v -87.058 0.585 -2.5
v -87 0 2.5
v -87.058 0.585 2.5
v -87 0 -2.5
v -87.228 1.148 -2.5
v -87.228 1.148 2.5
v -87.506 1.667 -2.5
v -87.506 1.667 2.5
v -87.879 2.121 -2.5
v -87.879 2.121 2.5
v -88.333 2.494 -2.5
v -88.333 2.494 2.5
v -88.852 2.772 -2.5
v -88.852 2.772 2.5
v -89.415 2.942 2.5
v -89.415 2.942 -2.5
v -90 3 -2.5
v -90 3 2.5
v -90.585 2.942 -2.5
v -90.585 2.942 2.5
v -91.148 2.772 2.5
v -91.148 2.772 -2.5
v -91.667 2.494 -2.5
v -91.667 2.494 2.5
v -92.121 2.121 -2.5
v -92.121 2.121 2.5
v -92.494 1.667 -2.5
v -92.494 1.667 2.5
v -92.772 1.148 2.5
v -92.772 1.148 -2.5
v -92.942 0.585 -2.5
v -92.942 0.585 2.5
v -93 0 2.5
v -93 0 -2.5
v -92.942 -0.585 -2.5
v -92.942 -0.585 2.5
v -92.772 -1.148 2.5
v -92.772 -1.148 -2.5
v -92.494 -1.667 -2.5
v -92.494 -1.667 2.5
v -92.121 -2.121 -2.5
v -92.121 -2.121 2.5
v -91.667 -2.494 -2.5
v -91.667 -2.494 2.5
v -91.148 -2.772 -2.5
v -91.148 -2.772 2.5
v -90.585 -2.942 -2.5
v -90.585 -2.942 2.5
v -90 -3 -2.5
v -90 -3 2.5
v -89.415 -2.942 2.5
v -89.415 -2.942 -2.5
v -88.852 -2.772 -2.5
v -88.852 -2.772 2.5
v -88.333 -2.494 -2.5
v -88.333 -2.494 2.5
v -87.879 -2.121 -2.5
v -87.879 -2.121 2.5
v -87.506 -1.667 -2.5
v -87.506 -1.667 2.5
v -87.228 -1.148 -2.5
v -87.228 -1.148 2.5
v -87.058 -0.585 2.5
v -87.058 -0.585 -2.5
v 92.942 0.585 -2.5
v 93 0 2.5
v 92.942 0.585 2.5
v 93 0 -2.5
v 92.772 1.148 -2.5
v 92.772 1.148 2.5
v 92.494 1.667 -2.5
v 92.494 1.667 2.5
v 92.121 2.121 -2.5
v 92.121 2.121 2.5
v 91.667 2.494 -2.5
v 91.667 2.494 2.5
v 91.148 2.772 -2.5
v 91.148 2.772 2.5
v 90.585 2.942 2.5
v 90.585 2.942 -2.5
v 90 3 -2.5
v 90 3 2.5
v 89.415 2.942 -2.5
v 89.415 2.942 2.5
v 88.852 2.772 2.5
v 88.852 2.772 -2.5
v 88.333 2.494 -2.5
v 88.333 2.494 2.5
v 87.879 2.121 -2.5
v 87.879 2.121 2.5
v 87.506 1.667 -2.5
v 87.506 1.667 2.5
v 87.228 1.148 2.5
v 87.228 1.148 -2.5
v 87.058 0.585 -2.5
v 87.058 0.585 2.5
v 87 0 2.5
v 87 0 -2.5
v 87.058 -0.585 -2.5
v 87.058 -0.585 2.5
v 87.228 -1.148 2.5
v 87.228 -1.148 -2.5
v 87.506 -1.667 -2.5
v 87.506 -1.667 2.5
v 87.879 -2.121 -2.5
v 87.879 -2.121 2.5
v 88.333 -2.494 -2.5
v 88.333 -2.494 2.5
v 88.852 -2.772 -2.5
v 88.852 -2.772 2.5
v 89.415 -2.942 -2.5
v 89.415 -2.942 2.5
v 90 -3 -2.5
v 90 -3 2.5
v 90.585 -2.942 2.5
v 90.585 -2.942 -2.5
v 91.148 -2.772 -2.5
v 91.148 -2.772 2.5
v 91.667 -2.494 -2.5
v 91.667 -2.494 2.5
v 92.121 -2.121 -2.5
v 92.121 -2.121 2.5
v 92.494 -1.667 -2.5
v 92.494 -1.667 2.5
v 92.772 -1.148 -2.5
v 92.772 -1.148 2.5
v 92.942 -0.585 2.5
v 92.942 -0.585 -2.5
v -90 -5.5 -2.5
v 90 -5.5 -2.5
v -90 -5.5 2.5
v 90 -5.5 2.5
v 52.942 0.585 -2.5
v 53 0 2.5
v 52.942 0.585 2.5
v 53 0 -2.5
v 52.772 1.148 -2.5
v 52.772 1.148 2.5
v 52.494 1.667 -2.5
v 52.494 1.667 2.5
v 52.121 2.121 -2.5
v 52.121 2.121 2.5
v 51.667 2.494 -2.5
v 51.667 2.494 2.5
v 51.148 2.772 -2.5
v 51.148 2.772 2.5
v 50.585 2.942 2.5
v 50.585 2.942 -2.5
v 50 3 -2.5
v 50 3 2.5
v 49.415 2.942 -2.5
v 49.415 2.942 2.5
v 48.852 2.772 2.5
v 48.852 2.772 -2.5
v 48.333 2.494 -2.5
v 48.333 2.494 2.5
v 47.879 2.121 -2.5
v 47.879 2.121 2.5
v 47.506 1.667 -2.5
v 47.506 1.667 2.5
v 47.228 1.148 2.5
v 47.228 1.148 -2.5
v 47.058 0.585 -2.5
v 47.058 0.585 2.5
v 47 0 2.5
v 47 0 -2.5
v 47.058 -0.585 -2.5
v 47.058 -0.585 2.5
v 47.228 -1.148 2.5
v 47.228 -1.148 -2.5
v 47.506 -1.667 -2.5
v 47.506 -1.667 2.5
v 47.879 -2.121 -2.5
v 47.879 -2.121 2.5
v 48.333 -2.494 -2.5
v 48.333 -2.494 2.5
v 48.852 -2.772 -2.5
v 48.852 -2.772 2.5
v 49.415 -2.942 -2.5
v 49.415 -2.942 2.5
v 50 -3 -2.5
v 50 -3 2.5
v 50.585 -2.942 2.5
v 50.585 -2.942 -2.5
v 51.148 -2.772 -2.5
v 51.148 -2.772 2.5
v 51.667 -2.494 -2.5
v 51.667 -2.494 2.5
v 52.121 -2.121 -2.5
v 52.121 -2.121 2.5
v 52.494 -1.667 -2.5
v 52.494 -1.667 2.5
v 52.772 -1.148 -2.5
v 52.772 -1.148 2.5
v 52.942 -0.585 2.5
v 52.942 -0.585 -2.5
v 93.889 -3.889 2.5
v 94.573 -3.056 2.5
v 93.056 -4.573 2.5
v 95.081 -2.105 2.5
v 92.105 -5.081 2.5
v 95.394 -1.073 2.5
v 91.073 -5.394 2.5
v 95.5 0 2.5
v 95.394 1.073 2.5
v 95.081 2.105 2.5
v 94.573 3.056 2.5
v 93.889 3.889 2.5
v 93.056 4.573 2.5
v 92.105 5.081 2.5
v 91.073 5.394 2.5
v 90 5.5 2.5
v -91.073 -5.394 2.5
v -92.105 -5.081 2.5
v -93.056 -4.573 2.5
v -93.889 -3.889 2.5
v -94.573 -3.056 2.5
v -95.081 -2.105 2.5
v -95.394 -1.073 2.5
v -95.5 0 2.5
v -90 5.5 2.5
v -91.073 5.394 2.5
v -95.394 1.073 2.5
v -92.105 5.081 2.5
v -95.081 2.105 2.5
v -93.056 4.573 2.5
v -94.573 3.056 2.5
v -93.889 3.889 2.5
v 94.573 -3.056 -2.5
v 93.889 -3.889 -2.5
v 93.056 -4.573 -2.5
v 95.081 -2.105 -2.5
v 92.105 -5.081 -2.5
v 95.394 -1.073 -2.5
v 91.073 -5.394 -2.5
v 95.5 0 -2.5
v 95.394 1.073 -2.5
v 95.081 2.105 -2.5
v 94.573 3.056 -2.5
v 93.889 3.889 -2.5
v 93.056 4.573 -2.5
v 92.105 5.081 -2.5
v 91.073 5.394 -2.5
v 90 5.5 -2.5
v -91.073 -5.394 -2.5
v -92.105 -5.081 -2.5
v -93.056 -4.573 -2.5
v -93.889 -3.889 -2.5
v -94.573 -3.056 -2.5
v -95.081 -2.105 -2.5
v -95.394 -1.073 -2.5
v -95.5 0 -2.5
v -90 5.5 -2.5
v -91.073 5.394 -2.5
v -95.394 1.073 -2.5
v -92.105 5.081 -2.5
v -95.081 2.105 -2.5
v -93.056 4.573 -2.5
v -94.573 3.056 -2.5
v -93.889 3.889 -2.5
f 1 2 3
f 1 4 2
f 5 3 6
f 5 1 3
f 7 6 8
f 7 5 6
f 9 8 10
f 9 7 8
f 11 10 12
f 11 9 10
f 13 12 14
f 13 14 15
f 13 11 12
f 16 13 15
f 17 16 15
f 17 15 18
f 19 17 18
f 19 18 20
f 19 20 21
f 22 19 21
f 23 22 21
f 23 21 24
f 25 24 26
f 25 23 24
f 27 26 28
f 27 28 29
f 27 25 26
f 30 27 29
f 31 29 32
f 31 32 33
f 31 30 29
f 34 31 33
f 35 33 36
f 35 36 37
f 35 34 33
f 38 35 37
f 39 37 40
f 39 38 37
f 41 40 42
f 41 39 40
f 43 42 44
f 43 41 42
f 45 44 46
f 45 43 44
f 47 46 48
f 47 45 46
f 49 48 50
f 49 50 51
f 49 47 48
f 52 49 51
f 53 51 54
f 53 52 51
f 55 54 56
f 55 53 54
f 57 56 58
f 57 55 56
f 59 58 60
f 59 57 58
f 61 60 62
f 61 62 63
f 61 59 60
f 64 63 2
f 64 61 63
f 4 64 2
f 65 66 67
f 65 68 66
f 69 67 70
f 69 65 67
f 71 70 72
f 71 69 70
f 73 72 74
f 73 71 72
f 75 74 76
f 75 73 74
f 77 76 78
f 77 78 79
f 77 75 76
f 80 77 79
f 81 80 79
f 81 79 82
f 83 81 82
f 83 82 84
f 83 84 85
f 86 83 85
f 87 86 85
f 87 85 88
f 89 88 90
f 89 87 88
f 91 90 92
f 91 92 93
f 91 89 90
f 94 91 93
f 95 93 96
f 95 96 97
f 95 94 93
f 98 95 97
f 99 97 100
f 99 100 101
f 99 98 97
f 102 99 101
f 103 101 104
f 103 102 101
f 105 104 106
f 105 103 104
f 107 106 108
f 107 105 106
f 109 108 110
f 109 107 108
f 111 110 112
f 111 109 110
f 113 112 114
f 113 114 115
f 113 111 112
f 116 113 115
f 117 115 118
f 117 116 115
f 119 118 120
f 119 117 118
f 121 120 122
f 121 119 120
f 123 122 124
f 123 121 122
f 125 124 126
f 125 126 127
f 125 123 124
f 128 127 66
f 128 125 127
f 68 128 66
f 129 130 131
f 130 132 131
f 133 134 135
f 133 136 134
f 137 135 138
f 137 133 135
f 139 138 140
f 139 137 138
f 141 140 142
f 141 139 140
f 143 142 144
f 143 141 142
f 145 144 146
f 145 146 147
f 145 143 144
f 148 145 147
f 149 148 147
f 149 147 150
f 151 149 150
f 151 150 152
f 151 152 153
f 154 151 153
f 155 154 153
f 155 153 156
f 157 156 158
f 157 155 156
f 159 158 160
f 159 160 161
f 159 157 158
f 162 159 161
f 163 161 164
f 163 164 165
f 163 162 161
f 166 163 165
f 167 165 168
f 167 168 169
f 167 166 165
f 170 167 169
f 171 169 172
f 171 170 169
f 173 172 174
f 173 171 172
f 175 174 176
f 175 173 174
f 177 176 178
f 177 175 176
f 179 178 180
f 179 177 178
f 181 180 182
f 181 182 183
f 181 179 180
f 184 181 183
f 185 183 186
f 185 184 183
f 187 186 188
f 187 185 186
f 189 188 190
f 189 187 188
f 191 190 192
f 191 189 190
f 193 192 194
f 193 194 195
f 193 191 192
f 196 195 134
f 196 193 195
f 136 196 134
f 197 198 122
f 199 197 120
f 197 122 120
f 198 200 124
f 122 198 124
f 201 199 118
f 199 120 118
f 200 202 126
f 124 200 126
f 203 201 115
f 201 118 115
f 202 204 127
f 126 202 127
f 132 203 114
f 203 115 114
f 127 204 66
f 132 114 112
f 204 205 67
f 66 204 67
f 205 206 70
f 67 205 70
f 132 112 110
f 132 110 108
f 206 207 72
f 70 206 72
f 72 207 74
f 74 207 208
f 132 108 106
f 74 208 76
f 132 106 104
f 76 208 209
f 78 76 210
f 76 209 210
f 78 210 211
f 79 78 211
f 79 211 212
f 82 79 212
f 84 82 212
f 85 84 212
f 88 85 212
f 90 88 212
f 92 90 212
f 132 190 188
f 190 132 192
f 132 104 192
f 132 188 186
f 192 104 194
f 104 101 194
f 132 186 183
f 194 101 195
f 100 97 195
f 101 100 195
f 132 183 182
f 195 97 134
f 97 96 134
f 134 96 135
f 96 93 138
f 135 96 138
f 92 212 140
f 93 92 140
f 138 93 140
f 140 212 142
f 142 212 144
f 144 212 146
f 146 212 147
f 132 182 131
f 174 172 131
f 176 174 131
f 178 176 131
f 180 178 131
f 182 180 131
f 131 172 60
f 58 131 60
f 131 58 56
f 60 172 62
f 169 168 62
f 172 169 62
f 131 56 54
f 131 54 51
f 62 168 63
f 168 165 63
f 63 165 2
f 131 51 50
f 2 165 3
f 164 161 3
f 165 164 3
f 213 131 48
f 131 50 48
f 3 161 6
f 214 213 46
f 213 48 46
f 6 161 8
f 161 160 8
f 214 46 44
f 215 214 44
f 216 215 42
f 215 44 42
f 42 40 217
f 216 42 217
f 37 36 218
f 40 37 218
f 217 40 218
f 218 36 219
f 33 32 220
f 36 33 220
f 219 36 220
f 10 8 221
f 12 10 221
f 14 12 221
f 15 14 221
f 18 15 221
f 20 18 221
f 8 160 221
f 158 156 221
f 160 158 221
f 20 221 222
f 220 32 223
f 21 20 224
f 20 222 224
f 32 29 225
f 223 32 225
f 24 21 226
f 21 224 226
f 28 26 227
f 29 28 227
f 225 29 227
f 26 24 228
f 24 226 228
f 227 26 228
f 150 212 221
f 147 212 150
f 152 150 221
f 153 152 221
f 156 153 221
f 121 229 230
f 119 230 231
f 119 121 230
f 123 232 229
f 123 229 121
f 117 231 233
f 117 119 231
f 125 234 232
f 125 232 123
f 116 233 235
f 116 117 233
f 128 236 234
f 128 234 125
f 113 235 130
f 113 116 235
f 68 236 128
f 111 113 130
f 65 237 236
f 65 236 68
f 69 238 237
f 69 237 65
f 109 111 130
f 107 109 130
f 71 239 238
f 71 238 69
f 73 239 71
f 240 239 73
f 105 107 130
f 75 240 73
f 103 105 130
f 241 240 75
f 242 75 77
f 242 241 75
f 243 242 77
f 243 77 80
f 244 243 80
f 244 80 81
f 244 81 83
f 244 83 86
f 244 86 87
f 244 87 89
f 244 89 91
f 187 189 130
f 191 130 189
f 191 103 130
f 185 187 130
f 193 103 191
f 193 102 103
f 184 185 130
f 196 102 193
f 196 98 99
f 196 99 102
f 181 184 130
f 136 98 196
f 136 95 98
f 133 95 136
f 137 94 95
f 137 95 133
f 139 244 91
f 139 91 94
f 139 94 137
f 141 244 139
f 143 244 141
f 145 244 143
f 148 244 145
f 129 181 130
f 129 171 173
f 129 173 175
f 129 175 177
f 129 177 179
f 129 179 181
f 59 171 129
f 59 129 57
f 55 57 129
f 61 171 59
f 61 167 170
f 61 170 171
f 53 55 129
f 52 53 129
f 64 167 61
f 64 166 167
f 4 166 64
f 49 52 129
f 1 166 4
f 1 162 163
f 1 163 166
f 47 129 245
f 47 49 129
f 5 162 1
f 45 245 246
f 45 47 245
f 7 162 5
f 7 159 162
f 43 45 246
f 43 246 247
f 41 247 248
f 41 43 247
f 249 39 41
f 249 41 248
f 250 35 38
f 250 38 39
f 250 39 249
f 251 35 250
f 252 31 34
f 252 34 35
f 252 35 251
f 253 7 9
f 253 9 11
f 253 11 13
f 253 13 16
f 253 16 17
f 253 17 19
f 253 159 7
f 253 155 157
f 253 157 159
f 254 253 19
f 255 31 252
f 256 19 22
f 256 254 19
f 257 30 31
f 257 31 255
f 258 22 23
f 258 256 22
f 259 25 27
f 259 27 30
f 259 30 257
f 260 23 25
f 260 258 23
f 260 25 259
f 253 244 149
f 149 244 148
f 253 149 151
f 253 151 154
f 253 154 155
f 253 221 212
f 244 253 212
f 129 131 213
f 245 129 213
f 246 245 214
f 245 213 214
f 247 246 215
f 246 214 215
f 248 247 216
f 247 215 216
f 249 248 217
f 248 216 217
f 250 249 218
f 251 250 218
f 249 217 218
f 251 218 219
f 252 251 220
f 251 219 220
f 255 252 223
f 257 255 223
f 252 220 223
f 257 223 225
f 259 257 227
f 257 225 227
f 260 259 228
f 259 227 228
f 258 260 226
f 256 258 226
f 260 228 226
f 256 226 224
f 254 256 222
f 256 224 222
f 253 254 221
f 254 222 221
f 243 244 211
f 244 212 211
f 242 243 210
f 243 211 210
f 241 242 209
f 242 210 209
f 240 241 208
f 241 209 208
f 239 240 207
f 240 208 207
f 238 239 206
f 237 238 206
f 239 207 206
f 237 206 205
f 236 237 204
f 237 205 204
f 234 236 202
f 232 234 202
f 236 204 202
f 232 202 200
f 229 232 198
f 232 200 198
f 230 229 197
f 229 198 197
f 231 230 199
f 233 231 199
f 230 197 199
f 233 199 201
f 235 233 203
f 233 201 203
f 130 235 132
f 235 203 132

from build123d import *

# Parameters (mm, degrees)
SKETCH1_R           = 3
BOSS_EXTRUDE1_DEPTH = 2.5


with BuildPart() as part:
    # Sketch1 → Boss-Extrude1 (new body, symmetric)
    with BuildSketch(Plane.XY):
        with BuildLine():
            Line((-90, 5.5), (90, 5.5))
            ThreePointArc((90, 5.5), (95.5, 0), (90, -5.5))
            Line((90, -5.5), (-90, -5.5))
            ThreePointArc((-90, -5.5), (-95.5, 0), (-90, 5.5))
        make_face()
        with Locations((-90, 0)):
            Circle(SKETCH1_R, mode=Mode.SUBTRACT)
        with Locations((90, 0)):
            Circle(SKETCH1_R, mode=Mode.SUBTRACT)
        with Locations((50, 0)):
            Circle(SKETCH1_R, mode=Mode.SUBTRACT)
    extrude(amount=BOSS_EXTRUDE1_DEPTH, both=True)


solid = part.part
